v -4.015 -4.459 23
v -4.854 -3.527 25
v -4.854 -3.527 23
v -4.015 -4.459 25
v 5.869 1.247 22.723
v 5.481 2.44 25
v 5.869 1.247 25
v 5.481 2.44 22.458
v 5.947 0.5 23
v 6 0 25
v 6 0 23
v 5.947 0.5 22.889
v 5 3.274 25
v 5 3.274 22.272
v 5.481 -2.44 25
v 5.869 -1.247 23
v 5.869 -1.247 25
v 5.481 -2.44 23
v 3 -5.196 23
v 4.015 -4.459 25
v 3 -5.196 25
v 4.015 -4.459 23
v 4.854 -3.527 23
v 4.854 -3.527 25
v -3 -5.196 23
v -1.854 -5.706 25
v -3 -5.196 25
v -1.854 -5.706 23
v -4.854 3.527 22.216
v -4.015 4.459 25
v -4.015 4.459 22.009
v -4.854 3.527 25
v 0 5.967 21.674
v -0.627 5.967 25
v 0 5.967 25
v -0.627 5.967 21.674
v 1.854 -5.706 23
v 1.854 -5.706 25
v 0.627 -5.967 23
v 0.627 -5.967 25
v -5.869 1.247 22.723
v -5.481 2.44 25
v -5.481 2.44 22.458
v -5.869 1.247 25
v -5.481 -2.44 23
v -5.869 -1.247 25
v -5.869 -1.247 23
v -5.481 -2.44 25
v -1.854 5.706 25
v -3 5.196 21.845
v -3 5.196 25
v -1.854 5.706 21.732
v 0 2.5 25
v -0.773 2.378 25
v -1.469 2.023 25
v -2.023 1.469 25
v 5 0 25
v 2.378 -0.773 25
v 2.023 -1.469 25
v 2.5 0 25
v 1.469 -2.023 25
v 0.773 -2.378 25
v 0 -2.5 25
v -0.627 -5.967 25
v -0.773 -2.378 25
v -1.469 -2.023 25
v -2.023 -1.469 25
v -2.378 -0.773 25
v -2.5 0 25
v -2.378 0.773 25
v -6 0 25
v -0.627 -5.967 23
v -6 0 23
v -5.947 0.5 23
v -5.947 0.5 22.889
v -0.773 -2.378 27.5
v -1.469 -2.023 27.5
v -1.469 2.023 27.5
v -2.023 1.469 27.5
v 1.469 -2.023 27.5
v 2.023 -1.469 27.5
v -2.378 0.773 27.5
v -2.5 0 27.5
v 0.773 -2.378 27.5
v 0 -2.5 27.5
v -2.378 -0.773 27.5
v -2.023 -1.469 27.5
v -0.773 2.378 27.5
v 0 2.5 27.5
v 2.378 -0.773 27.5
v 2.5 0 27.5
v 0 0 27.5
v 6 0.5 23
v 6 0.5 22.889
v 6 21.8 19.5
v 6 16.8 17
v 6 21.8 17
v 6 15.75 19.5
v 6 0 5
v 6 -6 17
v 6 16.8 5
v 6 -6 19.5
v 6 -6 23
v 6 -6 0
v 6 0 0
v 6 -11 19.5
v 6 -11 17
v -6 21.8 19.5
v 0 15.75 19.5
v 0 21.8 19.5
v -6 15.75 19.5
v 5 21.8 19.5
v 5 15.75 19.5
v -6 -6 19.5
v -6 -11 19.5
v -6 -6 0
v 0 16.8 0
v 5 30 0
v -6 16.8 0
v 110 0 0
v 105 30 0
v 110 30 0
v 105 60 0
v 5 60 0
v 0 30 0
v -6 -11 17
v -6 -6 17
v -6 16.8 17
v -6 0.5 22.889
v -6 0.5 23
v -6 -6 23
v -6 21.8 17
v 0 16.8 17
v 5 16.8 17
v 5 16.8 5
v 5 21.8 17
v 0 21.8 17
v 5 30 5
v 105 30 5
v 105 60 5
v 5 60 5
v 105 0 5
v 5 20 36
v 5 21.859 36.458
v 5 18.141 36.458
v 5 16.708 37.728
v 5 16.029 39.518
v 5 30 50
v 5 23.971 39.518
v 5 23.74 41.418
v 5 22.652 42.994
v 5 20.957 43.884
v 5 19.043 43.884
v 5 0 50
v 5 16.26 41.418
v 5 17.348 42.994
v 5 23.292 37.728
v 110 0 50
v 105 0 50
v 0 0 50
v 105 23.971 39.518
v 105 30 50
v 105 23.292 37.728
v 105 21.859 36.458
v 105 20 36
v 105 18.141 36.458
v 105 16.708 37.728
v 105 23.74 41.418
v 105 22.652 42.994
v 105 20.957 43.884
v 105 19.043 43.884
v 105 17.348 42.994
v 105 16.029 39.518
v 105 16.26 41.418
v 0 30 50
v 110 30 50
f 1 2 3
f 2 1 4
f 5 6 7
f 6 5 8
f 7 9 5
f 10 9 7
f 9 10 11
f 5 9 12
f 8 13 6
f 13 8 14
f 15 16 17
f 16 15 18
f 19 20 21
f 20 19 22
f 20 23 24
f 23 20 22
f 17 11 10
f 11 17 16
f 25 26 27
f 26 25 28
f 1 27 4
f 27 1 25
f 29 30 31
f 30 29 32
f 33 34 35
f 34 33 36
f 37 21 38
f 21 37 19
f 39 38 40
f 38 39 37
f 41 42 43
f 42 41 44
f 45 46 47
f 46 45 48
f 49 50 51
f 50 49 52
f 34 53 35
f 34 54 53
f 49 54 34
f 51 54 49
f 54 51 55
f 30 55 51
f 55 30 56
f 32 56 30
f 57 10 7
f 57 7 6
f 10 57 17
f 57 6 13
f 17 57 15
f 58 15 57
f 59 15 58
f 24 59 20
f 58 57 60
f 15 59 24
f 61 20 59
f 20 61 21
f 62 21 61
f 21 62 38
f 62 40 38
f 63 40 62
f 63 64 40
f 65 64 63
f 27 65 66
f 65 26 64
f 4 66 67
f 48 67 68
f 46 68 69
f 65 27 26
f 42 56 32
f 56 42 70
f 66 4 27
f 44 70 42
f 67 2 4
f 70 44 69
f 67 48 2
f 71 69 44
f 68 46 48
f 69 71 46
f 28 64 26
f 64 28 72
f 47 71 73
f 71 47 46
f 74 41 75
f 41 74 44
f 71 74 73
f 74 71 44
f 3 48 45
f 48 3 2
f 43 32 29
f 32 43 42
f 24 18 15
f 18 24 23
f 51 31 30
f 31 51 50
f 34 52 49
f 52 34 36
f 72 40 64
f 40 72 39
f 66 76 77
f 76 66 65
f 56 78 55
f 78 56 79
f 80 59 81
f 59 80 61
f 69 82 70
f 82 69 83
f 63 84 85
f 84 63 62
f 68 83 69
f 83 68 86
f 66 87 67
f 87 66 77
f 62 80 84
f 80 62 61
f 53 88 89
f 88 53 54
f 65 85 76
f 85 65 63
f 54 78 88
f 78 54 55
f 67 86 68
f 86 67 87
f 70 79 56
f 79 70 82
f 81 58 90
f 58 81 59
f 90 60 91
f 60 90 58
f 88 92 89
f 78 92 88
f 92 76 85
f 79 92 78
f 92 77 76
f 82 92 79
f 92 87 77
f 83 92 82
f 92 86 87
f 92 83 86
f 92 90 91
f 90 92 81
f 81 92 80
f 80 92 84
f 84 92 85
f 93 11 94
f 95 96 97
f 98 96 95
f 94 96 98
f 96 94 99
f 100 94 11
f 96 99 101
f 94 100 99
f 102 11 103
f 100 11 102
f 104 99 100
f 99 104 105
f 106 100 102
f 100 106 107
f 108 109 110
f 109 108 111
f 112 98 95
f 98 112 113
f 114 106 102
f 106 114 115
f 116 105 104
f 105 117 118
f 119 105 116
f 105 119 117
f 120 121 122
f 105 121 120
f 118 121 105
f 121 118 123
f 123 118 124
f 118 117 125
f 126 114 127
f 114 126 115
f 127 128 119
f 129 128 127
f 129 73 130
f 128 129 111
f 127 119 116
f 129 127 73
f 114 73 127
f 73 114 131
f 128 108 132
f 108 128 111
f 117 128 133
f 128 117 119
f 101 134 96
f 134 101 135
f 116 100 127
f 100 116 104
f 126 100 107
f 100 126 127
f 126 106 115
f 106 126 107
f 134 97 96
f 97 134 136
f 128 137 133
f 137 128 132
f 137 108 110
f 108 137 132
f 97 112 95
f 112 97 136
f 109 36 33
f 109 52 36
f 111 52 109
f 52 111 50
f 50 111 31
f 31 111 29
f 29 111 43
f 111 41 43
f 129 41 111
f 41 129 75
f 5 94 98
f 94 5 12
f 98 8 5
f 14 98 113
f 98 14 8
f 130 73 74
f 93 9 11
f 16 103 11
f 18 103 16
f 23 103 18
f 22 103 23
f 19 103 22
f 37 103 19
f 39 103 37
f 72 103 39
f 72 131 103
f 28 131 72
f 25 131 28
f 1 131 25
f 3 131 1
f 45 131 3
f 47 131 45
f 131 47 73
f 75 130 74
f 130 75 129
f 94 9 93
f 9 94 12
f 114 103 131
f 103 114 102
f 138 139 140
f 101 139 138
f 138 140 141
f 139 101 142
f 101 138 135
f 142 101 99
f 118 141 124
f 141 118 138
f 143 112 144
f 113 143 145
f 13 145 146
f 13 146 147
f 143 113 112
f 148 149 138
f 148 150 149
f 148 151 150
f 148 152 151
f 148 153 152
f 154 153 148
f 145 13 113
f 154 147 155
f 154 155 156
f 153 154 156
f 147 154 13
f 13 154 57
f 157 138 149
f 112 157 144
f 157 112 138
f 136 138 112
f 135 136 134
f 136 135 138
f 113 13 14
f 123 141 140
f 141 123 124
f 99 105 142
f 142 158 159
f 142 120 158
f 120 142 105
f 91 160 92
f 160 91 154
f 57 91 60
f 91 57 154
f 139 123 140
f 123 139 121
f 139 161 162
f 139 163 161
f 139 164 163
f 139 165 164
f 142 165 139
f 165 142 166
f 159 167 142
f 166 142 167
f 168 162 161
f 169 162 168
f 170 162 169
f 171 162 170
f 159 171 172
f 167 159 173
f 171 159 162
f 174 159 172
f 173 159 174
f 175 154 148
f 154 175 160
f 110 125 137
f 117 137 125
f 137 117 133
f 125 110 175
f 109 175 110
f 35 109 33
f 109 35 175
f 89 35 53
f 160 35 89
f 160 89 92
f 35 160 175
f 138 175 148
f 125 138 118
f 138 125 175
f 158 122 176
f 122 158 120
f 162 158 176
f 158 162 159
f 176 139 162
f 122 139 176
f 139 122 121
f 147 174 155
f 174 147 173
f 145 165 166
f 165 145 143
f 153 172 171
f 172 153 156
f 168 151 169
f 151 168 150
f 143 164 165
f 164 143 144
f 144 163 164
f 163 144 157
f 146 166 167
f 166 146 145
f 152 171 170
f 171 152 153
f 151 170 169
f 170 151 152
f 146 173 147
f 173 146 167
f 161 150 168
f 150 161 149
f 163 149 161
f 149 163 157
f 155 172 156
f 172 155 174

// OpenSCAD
// file: needle_cam.scad
/*
 *  needle_cam.scad
 *  by Timothy Schmidt.
 *
 *  This program is free software; you can redistribute it and/or modify
 *  it under the terms of the GNU General Public License as published by
 *  the Free Software Foundation; either version 3 of the License, or
 *  (at your option) any later version.
 *
 *  This program is distributed in the hope that it will be useful,
 *  but WITHOUT ANY WARRANTY; without even the implied warranty of
 *  MERCHANTABILITY or FITNESS FOR A PARTICULAR PURPOSE.  See the
 *  GNU General Public License for more details.
 *
 *  You should have received a copy of the GNU General Public License
 *  along with this program; if not, write to the Free Software
 *  Foundation, Inc., 59 Temple Place, Suite 330, Boston, MA  02111-1307  USA
 *
*/

include <configuration.scad>

module needle_cam() {

}

needle_cam();
// file: needle_bed.scad
/*
 *  needle_bed.scad
 *  by Timothy Schmidt.
 *
 *  This program is free software; you can redistribute it and/or modify
 *  it under the terms of the GNU General Public License as published by
 *  the Free Software Foundation; either version 3 of the License, or
 *  (at your option) any later version.
 *
 *  This program is distributed in the hope that it will be useful,
 *  but WITHOUT ANY WARRANTY; without even the implied warranty of
 *  MERCHANTABILITY or FITNESS FOR A PARTICULAR PURPOSE.  See the
 *  GNU General Public License for more details.
 *
 *  You should have received a copy of the GNU General Public License
 *  along with this program; if not, write to the Free Software
 *  Foundation, Inc., 59 Temple Place, Suite 330, Boston, MA  02111-1307  USA
 *
*/

// integrated pegboard, screw holes, needle endstops

include <configuration.scad>

module needle_bed() {

	cube([$needle_bed_width, $needle_bed_depth, $needle_bed_height]);

}

needle_bed();
// file: guide_rail_mount.scad
/*
 *  guide_rail_mount.scad
 *  by Timothy Schmidt.
 *
 *  This program is free software; you can redistribute it and/or modify
 *  it under the terms of the GNU General Public License as published by
 *  the Free Software Foundation; either version 3 of the License, or
 *  (at your option) any later version.
 *
 *  This program is distributed in the hope that it will be useful,
 *  but WITHOUT ANY WARRANTY; without even the implied warranty of
 *  MERCHANTABILITY or FITNESS FOR A PARTICULAR PURPOSE.  See the
 *  GNU General Public License for more details.
 *
 *  You should have received a copy of the GNU General Public License
 *  along with this program; if not, write to the Free Software
 *  Foundation, Inc., 59 Temple Place, Suite 330, Boston, MA  02111-1307  USA
 *
*/

include <configuration.scad>

module guide_rail_mount(style) {
	cube([$guide_rail_mount_width, $guide_rail_mount_depth, $guide_rail_mount_height]);

	if (style == $idler) { echo("bob"); }

	if (style == $motor) { echo("nancy"); }

}

guide_rail_mount($motor);
// file: carriage.scad
/*
 *  carriage.scad
 *  by Timothy Schmidt.
 *
 *  This program is free software; you can redistribute it and/or modify
 *  it under the terms of the GNU General Public License as published by
 *  the Free Software Foundation; either version 3 of the License, or
 *  (at your option) any later version.
 *
 *  This program is distributed in the hope that it will be useful,
 *  but WITHOUT ANY WARRANTY; without even the implied warranty of
 *  MERCHANTABILITY or FITNESS FOR A PARTICULAR PURPOSE.  See the
 *  GNU General Public License for more details.
 *
 *  You should have received a copy of the GNU General Public License
 *  along with this program; if not, write to the Free Software
 *  Foundation, Inc., 59 Temple Place, Suite 330, Boston, MA  02111-1307  USA
 *
*/

include <configuration.scad>

module carriage() {

}

carriage();
// file: configuration.scad
// Constants
$needle_width = 0;
$needle_length = 0;
$needle_catch_offset = 0;
$needle_catch_depth = 0;
$needle_catch_height = 0;

$number_of_needles = 10;

$needle_spacing = 0;

$guide_rail_diameter = 8;
$guide_rail_height = 40;
$guide_rail_depth = 20;
$guide_rail_mount_width = 5;
$guide_rail_mount_depth = 30;
$guide_rail_mount_height = 50;
$idler = 1;
$motor = 2;

$needle_bed_width = 10;
$needle_bed_depth = 60;
$needle_bed_height = 5;

// Derived values
$skeinosaur_width = $needle_bed_width * $number_of_needles + $guide_rail_mount_width * 2;
$guide_rail_radius = $guide_rail_diameter / 2;
// main file
/*
 *  skeinosaur.scad
 *  by Timothy Schmidt.
 *
 *  This program is free software; you can redistribute it and/or modify
 *  it under the terms of the GNU General Public License as published by
 *  the Free Software Foundation; either version 3 of the License, or
 *  (at your option) any later version.
 *
 *  This program is distributed in the hope that it will be useful,
 *  but WITHOUT ANY WARRANTY; without even the implied warranty of
 *  MERCHANTABILITY or FITNESS FOR A PARTICULAR PURPOSE.  See the
 *  GNU General Public License for more details.
 *
 *  You should have received a copy of the GNU General Public License
 *  along with this program; if not, write to the Free Software
 *  Foundation, Inc., 59 Temple Place, Suite 330, Boston, MA  02111-1307  USA
 *
*/

include <configuration.scad>

use <MCAD/servos.scad>

use <carriage.scad>
use <guide_rail_mount.scad>
use <needle_bed.scad>
use <needle_cam.scad>

alignds420([0,0,0], [0,0,0], screws = 0, axle_lenght = 0);

carriage();

guide_rail_mount($motor);

translate([$skeinosaur_width - $guide_rail_mount_width, 0, 0])
guide_rail_mount($idler);

for (i=[0:$number_of_needles - 1]) {
	translate([$guide_rail_mount_width + i * $needle_bed_width, 0, 0])
	needle_bed();
}

needle_cam();

// Guide rail
translate([0, $guide_rail_depth, $guide_rail_height])
rotate([0,90,0])
cylinder(r=$guide_rail_radius, h=$skeinosaur_width);
